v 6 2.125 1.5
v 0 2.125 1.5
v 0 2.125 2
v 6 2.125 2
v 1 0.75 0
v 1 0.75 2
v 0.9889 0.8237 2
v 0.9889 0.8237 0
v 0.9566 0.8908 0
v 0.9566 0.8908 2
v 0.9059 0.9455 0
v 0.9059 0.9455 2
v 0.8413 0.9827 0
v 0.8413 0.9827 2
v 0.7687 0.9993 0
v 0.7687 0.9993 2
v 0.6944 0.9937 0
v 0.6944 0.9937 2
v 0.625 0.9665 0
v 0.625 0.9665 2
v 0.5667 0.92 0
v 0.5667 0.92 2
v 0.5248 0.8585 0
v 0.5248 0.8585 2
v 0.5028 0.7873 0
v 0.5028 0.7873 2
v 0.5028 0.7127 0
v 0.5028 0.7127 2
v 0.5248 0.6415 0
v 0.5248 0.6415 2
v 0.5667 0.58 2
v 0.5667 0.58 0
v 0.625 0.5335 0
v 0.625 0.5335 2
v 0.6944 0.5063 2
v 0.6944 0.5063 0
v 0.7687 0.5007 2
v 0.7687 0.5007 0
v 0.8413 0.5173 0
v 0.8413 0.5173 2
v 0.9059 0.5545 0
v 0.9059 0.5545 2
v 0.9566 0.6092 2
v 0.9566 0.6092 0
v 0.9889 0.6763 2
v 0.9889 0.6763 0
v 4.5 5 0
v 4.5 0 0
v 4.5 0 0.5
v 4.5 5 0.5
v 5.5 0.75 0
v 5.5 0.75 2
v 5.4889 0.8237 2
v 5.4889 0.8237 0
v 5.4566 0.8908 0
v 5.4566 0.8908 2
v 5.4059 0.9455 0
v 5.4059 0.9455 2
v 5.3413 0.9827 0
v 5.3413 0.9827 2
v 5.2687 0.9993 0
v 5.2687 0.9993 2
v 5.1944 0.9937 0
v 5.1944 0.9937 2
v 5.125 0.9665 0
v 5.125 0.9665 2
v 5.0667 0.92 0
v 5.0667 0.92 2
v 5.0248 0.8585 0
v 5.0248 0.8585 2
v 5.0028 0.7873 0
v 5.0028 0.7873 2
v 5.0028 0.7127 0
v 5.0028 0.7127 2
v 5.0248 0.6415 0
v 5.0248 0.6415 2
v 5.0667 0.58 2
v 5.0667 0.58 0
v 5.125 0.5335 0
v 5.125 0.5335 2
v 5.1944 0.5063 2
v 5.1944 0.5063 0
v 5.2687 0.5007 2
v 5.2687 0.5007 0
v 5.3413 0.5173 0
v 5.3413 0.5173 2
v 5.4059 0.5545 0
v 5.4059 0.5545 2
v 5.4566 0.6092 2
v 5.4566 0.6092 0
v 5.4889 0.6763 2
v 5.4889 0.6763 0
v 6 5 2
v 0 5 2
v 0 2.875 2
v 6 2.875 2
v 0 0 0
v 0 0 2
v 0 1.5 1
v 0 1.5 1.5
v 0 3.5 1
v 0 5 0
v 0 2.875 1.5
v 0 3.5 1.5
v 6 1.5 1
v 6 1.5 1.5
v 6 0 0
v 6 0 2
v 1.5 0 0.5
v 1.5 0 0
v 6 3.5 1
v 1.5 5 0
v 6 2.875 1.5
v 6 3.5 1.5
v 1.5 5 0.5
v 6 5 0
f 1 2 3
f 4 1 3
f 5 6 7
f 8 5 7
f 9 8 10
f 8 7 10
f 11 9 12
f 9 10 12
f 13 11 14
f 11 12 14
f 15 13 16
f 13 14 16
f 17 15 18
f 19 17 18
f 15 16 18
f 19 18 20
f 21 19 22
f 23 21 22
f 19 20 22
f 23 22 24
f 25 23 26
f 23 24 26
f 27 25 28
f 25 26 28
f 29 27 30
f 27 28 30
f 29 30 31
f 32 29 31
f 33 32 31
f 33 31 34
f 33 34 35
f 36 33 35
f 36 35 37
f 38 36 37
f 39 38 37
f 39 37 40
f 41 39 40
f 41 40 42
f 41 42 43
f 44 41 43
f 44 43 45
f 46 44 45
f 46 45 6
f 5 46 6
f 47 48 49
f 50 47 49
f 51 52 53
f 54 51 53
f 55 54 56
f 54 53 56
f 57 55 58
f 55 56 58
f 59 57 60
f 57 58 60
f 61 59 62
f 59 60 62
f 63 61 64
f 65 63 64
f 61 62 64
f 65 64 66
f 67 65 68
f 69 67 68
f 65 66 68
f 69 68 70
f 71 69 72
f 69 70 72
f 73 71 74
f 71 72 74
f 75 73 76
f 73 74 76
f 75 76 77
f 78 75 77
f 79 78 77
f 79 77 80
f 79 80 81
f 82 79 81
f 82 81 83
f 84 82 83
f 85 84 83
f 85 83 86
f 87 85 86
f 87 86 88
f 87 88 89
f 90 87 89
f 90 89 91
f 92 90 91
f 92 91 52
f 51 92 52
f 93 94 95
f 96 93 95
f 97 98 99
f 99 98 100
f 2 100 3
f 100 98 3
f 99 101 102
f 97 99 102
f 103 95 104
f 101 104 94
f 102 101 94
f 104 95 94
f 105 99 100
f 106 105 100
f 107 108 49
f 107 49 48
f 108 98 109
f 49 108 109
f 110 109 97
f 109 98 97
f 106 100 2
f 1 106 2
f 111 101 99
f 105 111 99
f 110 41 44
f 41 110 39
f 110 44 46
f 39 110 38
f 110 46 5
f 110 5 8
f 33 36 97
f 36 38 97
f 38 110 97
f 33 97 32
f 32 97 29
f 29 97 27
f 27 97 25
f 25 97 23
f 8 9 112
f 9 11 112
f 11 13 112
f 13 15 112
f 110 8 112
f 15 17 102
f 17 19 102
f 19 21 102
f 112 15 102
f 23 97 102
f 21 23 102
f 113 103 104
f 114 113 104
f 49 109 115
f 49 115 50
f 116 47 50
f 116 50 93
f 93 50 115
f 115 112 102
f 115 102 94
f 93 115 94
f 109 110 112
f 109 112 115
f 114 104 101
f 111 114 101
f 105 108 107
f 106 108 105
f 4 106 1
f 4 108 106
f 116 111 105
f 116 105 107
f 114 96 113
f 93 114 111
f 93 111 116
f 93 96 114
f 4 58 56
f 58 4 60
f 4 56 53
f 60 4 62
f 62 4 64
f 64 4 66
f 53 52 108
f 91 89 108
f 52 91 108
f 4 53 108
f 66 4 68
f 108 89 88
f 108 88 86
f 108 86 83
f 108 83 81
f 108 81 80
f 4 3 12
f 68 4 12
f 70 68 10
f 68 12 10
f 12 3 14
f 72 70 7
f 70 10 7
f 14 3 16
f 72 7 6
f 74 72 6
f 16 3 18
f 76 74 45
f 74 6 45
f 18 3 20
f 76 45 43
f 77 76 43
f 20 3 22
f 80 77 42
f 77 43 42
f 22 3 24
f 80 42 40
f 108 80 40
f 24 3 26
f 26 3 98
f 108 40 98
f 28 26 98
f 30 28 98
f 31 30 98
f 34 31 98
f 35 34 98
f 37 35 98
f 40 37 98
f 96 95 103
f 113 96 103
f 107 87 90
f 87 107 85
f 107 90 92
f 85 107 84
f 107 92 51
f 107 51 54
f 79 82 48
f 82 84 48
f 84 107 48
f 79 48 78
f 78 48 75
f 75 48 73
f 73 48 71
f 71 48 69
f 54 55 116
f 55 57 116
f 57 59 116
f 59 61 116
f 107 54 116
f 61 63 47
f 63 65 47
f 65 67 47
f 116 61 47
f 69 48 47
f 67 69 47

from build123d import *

# Parameters (mm, degrees)
F1_DEPTH = 6
F2_R     = 0.25
F3_DEPTH = 25
F4_W     = 3
F4_H     = 0.5
F5_DEPTH = 25


with BuildPart() as f1:
    # F0 (on Right) → F1 (new body)
    with BuildSketch(Plane.YZ):
        Polygon((0, 2), (0, 0), (5, 0), (5, 2), (2.875, 2), (2.875, 1.5), (3.5, 1.5), (3.5, 1), (1.5, 1), (1.5, 1.5), (2.125, 1.5), (2.125, 2), align=None)
    extrude(amount=F1_DEPTH)

    # F2 (on face) → F3 (cut)
    with BuildSketch(Plane.XY.offset(2)):
        with Locations((0.75, 0.75)):
            Circle(F2_R)
        with Locations((5.25, 0.75)):
            Circle(F2_R)
    extrude(amount=-F3_DEPTH, mode=Mode.SUBTRACT)

    # F4 (on face) → F5 (cut)
    with BuildSketch(Plane.XZ):
        with Locations((3, 0.25)):
            Rectangle(F4_W, F4_H)
    extrude(amount=-F5_DEPTH, mode=Mode.SUBTRACT)


solid = f1.part
